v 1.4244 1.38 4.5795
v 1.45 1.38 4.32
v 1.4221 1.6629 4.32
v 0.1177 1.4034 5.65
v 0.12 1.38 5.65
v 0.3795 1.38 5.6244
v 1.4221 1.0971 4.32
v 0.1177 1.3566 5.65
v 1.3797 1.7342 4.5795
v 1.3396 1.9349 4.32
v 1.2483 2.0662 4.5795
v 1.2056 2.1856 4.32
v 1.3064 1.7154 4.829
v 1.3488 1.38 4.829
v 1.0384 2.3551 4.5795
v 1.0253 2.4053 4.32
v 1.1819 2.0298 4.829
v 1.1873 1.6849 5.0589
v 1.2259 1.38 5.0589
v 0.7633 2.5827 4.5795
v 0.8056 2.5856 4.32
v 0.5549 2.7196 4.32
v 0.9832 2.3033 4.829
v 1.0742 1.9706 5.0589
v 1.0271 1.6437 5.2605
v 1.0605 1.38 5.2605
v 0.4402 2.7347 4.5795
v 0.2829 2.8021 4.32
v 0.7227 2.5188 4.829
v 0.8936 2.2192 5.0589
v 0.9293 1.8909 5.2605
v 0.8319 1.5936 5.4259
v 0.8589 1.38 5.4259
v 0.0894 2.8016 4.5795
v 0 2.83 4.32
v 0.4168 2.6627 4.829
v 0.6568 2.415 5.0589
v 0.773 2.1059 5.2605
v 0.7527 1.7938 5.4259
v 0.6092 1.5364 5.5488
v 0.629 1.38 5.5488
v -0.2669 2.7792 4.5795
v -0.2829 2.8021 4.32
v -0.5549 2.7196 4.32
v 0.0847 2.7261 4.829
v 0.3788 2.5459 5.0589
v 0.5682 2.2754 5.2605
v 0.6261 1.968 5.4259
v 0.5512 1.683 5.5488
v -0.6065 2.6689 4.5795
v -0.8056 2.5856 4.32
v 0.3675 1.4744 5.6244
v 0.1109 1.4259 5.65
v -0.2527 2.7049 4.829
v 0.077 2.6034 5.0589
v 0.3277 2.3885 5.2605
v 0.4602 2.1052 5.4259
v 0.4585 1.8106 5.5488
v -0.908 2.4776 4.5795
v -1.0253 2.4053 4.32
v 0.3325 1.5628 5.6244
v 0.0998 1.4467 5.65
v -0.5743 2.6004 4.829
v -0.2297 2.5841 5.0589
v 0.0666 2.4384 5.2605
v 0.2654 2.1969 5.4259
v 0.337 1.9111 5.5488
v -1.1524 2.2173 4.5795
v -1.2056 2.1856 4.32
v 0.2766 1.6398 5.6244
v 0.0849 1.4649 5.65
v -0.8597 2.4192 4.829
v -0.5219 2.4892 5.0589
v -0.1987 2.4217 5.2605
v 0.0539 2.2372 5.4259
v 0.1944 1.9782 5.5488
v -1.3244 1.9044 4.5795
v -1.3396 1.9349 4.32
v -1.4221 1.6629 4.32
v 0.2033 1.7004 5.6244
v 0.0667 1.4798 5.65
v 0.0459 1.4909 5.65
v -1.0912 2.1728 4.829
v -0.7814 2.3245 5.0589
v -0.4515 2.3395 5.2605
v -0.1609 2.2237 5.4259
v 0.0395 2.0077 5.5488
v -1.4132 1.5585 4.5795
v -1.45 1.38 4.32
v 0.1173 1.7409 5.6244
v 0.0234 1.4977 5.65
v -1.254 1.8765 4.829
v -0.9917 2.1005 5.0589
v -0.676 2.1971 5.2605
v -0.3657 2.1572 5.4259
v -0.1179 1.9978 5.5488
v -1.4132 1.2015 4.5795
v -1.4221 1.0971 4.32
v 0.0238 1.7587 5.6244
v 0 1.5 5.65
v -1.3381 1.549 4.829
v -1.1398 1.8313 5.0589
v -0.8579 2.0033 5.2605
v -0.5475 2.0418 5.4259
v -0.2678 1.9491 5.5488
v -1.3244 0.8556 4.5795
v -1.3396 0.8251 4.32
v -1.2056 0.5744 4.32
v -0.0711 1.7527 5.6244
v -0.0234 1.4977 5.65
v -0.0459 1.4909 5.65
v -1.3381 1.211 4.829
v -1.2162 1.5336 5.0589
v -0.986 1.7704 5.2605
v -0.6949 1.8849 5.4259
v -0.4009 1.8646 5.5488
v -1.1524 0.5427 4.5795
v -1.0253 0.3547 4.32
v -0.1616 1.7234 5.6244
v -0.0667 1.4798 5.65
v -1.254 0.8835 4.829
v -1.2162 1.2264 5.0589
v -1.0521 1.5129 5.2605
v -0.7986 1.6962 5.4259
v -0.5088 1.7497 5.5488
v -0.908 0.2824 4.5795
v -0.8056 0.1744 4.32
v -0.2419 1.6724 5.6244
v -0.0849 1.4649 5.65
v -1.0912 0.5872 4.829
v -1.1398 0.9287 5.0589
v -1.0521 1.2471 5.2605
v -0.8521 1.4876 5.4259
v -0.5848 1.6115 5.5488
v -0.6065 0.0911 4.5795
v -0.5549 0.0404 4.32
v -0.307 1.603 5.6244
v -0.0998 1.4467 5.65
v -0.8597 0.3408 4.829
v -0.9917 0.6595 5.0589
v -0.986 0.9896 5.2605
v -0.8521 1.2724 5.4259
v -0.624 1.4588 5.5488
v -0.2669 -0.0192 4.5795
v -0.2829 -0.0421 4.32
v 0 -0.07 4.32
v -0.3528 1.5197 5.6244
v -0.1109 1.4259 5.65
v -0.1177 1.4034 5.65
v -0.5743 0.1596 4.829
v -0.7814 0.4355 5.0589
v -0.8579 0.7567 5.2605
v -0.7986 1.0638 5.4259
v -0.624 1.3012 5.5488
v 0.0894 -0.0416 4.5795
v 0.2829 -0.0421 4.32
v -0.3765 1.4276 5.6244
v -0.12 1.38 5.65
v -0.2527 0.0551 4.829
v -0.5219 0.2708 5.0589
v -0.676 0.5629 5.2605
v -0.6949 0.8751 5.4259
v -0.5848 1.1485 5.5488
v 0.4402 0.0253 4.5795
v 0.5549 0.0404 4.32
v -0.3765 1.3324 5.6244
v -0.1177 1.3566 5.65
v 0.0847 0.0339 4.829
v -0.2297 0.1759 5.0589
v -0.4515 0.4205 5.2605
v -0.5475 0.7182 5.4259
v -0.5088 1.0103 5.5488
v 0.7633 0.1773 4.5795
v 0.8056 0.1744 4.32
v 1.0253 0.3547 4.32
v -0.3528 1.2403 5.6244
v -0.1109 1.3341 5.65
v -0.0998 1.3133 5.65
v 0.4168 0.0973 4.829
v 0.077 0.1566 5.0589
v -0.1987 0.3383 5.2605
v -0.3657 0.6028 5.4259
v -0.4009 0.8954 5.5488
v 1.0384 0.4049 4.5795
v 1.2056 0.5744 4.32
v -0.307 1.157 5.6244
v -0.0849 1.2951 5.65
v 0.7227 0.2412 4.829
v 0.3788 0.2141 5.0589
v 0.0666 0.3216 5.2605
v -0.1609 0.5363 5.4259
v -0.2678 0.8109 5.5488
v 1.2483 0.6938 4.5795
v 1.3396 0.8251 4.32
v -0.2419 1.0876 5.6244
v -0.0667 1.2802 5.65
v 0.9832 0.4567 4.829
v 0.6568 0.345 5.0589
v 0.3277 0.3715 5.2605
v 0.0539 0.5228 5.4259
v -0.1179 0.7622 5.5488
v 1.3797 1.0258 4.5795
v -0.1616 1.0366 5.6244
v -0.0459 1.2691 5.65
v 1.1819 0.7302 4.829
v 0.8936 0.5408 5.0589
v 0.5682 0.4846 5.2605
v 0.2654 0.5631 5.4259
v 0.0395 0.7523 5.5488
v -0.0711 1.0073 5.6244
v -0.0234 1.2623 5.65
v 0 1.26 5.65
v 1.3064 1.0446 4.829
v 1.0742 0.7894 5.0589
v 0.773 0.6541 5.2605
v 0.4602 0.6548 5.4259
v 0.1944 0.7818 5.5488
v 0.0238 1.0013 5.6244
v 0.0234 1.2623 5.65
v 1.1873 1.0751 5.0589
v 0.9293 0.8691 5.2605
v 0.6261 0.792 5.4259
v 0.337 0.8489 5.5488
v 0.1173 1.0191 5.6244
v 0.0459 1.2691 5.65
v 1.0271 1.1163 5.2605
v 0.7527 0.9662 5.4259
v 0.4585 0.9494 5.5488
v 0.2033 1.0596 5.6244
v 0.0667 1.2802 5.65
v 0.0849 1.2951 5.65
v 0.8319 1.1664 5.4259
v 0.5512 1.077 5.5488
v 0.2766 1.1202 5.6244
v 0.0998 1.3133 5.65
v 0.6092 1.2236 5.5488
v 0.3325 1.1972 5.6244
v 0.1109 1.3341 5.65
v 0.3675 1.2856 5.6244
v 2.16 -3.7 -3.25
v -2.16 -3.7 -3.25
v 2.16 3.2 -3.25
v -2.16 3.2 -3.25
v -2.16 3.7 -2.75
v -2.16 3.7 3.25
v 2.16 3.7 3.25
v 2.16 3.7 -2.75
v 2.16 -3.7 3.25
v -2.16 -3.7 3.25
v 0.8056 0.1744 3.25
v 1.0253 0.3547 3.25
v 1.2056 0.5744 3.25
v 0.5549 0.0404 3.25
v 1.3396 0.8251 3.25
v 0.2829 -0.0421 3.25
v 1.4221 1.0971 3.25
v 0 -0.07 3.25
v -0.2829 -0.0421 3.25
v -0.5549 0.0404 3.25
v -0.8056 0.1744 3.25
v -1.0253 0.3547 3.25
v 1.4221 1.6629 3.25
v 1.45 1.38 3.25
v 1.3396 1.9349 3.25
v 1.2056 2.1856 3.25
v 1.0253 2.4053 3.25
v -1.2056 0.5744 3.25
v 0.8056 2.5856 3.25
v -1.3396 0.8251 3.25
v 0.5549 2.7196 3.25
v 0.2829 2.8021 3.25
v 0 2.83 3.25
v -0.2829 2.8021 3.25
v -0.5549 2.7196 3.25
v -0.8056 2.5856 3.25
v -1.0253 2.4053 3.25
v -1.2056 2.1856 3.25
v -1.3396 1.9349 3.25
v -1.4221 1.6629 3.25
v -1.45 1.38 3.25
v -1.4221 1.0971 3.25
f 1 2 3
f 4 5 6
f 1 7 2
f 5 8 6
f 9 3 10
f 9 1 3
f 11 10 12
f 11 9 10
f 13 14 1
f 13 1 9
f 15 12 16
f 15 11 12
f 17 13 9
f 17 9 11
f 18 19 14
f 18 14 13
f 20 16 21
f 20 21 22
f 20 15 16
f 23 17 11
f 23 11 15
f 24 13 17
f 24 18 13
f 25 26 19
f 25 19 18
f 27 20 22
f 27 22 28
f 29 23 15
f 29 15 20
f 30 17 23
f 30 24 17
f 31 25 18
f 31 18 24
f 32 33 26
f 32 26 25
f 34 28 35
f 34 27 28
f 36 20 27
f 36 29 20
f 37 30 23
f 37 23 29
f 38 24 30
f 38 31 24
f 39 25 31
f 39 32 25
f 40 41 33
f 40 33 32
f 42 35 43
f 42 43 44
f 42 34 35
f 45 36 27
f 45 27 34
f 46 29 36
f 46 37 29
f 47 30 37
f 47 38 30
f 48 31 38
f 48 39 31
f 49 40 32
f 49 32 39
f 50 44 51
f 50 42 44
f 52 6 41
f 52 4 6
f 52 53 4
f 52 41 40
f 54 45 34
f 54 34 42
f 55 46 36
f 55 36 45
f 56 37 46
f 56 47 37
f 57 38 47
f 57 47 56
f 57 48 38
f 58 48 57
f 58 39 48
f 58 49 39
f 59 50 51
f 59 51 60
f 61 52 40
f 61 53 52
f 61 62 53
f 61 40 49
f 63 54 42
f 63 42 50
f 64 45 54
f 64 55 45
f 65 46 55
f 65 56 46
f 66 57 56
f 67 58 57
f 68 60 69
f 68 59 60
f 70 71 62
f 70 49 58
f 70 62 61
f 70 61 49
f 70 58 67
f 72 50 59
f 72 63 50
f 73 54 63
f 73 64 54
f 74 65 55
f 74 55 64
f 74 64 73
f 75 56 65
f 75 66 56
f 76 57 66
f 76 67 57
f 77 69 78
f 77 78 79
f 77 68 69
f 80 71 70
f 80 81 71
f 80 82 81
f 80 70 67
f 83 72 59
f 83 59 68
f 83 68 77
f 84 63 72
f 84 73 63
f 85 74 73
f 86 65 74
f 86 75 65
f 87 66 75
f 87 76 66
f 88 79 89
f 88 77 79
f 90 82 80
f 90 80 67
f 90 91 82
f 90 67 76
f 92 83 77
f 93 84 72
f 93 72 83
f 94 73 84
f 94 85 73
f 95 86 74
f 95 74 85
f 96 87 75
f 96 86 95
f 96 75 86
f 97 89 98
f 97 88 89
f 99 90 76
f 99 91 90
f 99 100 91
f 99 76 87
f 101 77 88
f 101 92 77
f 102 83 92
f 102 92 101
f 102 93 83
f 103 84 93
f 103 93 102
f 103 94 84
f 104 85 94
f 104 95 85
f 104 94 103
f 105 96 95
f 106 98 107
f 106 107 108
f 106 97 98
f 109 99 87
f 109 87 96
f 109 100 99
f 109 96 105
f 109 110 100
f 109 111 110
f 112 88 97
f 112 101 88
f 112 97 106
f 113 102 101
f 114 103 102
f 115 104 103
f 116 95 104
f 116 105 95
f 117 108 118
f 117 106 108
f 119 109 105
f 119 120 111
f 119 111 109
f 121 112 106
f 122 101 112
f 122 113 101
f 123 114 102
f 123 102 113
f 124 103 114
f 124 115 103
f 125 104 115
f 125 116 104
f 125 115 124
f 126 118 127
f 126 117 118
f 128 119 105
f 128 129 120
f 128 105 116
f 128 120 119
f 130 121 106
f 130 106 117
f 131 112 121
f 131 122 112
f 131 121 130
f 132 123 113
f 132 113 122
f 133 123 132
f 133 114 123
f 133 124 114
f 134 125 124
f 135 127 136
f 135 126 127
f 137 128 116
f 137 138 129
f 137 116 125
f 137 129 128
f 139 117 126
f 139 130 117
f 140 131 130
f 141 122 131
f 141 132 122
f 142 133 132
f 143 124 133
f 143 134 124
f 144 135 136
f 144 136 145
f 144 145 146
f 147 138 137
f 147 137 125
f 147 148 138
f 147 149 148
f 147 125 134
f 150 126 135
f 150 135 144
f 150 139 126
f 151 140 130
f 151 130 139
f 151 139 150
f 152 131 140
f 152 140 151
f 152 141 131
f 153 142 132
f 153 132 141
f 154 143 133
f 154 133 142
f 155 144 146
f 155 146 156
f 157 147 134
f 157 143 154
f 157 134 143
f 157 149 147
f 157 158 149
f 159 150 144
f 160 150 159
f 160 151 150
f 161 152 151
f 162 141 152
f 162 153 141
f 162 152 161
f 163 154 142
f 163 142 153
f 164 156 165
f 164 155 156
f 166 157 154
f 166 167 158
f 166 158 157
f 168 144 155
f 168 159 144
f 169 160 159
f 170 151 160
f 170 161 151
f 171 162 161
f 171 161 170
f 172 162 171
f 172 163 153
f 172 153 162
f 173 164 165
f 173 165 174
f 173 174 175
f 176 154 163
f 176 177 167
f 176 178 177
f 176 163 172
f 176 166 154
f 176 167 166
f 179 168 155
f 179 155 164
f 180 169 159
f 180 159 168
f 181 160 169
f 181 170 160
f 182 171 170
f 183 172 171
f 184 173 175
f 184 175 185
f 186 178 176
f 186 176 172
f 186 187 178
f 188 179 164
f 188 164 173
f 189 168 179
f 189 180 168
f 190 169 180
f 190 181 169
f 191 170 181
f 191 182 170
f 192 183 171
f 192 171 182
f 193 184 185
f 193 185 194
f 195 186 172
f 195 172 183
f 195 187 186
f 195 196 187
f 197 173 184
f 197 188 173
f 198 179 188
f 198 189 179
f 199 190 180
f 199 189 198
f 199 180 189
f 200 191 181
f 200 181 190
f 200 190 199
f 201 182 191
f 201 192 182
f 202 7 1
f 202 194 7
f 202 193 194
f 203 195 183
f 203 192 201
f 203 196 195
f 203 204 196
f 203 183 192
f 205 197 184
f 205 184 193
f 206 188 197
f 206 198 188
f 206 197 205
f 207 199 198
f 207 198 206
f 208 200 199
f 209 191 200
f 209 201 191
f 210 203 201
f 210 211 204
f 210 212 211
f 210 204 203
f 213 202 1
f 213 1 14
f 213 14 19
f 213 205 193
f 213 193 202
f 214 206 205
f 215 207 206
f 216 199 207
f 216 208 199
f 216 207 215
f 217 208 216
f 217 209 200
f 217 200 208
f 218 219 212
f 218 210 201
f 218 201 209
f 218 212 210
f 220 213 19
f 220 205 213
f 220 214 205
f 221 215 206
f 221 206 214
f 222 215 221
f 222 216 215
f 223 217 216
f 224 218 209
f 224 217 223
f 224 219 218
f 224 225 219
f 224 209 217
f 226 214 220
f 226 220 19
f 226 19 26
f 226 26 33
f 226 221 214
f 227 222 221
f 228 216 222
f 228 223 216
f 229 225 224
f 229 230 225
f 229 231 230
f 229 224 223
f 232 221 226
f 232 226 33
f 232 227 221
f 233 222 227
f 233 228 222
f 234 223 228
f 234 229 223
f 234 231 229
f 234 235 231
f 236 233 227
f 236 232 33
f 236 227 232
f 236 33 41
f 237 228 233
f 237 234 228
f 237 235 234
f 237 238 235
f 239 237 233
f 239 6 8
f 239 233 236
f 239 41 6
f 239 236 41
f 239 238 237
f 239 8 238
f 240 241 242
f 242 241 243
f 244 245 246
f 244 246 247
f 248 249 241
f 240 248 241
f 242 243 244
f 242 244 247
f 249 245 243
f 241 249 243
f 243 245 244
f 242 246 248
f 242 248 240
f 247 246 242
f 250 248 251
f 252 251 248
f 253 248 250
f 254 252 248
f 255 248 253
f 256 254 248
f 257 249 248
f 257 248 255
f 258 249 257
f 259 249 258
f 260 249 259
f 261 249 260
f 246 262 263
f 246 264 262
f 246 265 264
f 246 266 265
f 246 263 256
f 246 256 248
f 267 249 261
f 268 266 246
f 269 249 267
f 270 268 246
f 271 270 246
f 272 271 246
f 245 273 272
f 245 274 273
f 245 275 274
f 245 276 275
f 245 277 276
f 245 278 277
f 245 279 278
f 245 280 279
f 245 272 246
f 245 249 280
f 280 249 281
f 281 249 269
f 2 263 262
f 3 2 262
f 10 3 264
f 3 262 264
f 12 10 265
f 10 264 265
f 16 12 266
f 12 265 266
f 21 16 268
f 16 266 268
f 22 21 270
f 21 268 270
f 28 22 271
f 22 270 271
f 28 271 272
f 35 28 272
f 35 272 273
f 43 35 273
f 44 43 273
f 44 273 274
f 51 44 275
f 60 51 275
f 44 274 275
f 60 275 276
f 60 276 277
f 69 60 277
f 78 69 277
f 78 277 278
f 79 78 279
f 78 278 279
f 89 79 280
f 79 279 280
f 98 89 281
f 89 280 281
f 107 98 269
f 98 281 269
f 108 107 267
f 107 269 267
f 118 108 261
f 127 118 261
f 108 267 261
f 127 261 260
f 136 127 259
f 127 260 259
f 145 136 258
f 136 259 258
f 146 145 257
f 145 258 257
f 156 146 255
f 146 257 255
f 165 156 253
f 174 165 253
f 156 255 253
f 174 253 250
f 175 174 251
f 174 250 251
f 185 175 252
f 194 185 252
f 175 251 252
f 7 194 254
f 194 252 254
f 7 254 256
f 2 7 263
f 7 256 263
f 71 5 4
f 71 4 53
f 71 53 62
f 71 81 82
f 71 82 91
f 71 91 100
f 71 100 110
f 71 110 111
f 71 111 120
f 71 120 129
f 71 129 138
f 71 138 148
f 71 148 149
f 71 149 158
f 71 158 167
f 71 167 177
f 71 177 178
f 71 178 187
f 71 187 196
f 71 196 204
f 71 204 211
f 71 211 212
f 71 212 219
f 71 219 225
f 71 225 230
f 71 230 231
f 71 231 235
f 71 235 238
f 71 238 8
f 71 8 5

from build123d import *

# Parameters (mm, degrees)
BOSS_EXTRUDE1_DEPTH      = 2.16
BOSS_EXTRUDE1_DEPTH_BACK = 2.16
SKETCH1_W                = 6.5
SKETCH1_H                = 7.4
SKETCH2_R                = 1.45
BOSS_EXTRUDE2_DEPTH      = 2.4
FILLET1_R                = 1.33
CHAMFER1_SIZE            = 0.5


with BuildPart() as part:
    # Sketch1 → Boss-Extrude1 (new, two sides: drawn at the far end of the back side and taken through both)
    with BuildSketch(Plane(origin=(0, 0, 0), x_dir=(0, 0, -1), z_dir=(1, 0, 0)).offset(-BOSS_EXTRUDE1_DEPTH_BACK)):
        Rectangle(SKETCH1_W, SKETCH1_H)
    extrude(amount=BOSS_EXTRUDE1_DEPTH + BOSS_EXTRUDE1_DEPTH_BACK)

    # Sketch2 → Boss-Extrude2 (add)
    with BuildSketch(Plane.XY.offset(3.25)):
        with Locations((0, 1.38)):
            Circle(SKETCH2_R)
    extrude(amount=BOSS_EXTRUDE2_DEPTH)

    # Fillet1
    fillet1_edges = [part.edges().sort_by_distance(p)[0] for p in [
        (-1.45, 1.38, 5.65),
    ]]
    fillet(fillet1_edges, radius=FILLET1_R)

    # Chamfer1
    chamfer1_edges = [part.edges().sort_by_distance(p)[0] for p in [
        (0, 3.7, -3.25),
    ]]
    chamfer(chamfer1_edges, length=CHAMFER1_SIZE)


solid = part.part
